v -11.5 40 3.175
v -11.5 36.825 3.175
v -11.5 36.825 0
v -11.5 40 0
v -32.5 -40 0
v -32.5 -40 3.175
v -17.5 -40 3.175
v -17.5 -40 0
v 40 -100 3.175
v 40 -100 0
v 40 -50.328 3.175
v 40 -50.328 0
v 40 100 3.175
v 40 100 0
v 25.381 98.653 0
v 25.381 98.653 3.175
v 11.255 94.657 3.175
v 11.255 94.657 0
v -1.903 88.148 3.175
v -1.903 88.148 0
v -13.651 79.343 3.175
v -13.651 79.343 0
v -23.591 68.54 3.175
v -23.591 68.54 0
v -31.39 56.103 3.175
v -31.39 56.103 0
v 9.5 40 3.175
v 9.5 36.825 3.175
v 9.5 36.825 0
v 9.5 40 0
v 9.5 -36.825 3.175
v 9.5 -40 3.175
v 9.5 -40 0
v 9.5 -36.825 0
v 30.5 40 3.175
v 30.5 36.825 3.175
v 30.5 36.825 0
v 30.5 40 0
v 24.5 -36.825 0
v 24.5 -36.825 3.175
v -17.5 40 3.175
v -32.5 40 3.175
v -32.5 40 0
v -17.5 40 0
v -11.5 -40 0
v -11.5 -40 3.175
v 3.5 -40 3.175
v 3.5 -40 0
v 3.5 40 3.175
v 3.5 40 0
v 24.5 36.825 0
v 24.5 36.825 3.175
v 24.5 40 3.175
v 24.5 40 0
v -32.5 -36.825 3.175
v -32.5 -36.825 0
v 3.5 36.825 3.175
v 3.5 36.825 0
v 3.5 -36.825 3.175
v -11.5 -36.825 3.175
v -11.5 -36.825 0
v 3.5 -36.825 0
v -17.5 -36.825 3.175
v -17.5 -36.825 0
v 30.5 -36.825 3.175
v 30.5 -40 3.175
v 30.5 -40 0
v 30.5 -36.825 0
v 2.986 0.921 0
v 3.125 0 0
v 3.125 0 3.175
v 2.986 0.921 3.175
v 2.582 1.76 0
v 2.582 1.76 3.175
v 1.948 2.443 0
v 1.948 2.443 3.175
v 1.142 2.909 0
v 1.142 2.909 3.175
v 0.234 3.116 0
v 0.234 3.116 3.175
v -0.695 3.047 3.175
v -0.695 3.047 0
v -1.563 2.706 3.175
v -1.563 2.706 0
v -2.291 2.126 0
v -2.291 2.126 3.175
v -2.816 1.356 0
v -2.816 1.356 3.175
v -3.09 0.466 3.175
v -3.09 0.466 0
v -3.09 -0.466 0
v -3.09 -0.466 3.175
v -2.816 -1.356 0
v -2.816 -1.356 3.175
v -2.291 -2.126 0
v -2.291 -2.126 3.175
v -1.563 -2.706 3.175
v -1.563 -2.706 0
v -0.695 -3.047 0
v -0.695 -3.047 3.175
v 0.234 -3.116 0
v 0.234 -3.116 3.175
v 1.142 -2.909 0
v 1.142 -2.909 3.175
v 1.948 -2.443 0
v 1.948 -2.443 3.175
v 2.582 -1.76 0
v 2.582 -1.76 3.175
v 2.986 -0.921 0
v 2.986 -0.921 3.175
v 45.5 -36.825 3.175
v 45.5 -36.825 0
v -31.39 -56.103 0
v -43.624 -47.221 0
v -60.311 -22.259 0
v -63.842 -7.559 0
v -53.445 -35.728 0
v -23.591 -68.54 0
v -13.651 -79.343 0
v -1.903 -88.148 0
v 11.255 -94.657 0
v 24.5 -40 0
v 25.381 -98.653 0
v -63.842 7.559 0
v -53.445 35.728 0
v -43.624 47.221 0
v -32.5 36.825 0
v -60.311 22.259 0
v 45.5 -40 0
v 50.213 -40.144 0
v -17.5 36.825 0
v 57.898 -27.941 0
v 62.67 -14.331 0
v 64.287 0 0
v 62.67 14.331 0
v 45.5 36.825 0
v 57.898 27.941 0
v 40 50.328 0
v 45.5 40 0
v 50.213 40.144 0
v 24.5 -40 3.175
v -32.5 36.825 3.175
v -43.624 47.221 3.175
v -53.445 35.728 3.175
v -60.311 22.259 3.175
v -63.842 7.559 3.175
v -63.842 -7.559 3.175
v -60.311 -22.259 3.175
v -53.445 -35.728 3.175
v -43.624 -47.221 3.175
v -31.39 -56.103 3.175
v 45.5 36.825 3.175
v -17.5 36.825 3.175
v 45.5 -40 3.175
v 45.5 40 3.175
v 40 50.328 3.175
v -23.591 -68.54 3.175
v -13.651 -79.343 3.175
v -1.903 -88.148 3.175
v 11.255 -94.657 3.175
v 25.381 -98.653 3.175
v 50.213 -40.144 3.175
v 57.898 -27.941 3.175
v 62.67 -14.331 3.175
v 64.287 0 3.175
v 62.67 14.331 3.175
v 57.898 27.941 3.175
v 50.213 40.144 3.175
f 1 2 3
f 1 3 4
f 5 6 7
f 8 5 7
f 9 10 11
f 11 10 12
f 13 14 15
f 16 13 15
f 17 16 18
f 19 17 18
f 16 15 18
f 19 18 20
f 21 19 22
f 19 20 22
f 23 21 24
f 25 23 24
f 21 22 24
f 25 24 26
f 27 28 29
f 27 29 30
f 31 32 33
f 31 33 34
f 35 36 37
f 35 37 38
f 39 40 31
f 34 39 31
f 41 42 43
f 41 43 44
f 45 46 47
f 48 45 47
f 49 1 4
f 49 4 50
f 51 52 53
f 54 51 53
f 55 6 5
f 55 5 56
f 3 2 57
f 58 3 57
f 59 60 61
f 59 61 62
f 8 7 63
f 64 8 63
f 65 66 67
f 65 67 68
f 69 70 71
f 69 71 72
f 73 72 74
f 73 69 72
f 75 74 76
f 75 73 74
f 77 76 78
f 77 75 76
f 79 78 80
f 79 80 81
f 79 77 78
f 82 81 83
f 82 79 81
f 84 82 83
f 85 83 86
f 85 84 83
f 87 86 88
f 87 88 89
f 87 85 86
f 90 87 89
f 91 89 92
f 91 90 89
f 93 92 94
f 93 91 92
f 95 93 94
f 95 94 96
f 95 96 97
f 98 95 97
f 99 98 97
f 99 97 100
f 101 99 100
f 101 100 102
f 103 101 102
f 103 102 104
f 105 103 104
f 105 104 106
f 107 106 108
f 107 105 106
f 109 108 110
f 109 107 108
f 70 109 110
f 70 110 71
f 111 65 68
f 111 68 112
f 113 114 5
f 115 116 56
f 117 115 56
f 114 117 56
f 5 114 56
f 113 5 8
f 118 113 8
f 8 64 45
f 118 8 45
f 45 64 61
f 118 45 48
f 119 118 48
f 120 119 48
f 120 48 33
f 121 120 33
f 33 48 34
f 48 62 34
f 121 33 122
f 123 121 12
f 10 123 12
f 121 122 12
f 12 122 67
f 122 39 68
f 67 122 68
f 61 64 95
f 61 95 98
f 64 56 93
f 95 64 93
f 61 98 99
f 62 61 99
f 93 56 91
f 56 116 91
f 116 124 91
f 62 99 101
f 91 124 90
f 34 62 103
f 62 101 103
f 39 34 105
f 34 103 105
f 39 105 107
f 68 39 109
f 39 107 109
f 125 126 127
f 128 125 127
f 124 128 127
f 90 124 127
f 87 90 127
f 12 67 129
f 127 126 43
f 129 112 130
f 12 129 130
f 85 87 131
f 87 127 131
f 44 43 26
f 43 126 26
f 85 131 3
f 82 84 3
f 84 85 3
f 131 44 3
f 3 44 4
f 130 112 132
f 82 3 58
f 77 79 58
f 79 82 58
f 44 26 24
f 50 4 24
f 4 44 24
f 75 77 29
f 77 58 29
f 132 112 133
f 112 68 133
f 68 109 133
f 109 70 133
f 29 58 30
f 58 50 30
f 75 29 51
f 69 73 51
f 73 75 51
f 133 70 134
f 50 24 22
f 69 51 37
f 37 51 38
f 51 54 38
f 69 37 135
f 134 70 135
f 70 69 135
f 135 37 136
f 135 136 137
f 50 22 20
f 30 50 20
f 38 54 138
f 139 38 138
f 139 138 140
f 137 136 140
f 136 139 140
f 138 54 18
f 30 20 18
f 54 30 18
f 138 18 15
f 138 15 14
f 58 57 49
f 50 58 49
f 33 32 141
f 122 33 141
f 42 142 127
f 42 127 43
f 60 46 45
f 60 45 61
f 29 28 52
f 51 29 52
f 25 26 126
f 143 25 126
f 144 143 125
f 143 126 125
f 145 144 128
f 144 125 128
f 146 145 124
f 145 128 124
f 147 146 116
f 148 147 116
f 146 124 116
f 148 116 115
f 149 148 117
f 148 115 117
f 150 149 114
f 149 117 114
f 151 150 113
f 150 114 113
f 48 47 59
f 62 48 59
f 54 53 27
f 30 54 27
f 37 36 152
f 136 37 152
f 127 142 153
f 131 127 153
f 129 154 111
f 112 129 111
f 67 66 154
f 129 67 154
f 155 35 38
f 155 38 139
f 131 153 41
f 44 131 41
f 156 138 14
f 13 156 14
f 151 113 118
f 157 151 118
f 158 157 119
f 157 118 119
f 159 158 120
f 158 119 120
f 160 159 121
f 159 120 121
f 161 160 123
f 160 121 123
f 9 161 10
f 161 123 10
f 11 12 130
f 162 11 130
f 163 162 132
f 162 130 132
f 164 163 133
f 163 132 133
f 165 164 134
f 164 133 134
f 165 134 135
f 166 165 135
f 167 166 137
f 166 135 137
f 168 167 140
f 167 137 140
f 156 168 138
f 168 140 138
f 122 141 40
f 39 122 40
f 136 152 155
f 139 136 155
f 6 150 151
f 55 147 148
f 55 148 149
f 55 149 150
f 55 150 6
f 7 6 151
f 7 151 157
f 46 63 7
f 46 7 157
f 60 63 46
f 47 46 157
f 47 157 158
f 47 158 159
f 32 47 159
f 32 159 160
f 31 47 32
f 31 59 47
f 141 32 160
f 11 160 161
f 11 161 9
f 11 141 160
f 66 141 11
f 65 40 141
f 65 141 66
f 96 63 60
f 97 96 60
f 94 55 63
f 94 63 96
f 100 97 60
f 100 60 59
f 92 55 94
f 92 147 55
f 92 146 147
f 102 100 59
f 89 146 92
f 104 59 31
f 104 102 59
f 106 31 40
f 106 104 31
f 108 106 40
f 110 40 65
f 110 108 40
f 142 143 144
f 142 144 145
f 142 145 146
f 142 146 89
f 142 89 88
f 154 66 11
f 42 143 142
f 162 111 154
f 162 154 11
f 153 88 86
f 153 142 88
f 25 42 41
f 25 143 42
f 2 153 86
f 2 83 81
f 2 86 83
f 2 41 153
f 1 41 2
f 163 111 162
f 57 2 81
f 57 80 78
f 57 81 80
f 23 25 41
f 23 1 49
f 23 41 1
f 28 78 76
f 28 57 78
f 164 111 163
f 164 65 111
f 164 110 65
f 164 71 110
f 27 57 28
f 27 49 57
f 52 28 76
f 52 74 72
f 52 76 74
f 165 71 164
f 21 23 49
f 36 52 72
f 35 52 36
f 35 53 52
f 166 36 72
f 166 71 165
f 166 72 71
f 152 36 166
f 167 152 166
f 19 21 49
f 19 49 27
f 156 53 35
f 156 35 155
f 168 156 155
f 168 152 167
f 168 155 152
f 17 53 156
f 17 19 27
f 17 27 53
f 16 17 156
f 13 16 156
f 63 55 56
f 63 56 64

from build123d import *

# Parameters (mm, degrees)
F0_R     = 3.125
F1_DEPTH = 3.175
F2_W     = 15
F2_H     = 3.175
F2_W_2   = 7.5
F3_DEPTH = 25


# Not quite as in the source:
# - a feature names something its author has since deleted; it is built from what else it names


with BuildPart() as f1:
    # F0 (on Top) → F1 (new body)
    with BuildSketch(Plane.XY):
        with BuildLine():
            ThreePointArc((40, -50.3277523465), (57.898111611, -27.9408541051), (64.2875, 0))
            ThreePointArc((64.2875, 0), (57.898111611, 27.9408541051), (40, 50.3277523465))
            Line((40, 50.3277523465), (40, -50.3277523465))
        make_face()
        with BuildLine():
            Line((40, -50.3277523465), (40, 50.3277523465))
            ThreePointArc((40, 50.3277523465), (5.1835564074, 64.0781819282), (-31.390378499, 56.1028234043))
            ThreePointArc((-31.390378499, 56.1028234043), (-37.8178330459, 38.5576092221), (-40, 20))
            Line((-40, 20), (-40, -20))
            ThreePointArc((-40, -20), (-37.8178330459, -38.5576092221), (-31.390378499, -56.1028234043))
            ThreePointArc((-31.390378499, -56.1028234043), (5.1835564074, -64.0781819282), (40, -50.3277523465))
        make_face()
        Circle(F0_R, mode=Mode.SUBTRACT)
        with BuildLine():
            ThreePointArc((-31.390378499, 56.1028234043), (5.1835564074, 64.0781819282), (40, 50.3277523465))
            Line((40, 50.3277523465), (40, 100))
            ThreePointArc((40, 100), (-1.9033061205, 88.1477287675), (-31.390378499, 56.1028234043))
        make_face()
        with BuildLine():
            Line((40, -100), (40, -50.3277523465))
            ThreePointArc((40, -50.3277523465), (5.1835564074, -64.0781819282), (-31.390378499, -56.1028234043))
            ThreePointArc((-31.390378499, -56.1028234043), (-1.9033061205, -88.1477287675), (40, -100))
        make_face()
        with BuildLine():
            ThreePointArc((-40, 20), (-37.8178330459, 38.5576092221), (-31.390378499, 56.1028234043))
            ThreePointArc((-31.390378499, 56.1028234043), (-64.2875, 0), (-31.390378499, -56.1028234043))
            ThreePointArc((-31.390378499, -56.1028234043), (-37.8178330459, -38.5576092221), (-40, -20))
            Line((-40, -20), (-40, 20))
        make_face()
    extrude(amount=F1_DEPTH)

    # F2 (on face) → F3 (cut)
    with BuildSketch(Plane.XY.offset(3.175)):
        with Locations((-4, 38.4125)):
            Rectangle(F2_W, F2_H)
        with Locations((13.25, 38.4125)):
            Rectangle(F2_W_2, F2_H)
        with Locations((20.75, 38.4125)):
            Rectangle(F2_W_2, F2_H)
        with Locations((38, 38.4125)):
            Rectangle(F2_W, F2_H)
        with Locations((-4, -38.4125)):
            Rectangle(F2_W, F2_H)
        with Locations((20.75, -38.4125)):
            Rectangle(F2_W_2, F2_H)
        with Locations((38, -38.4125)):
            Rectangle(F2_W, F2_H)
        with Locations((13.25, -38.4125)):
            Rectangle(F2_W_2, F2_H)
        with Locations((-25, -38.4125)):
            Rectangle(F2_W, F2_H)
        with Locations((-25, 38.4125)):
            Rectangle(F2_W, F2_H)
    extrude(amount=-F3_DEPTH, mode=Mode.SUBTRACT)


solid = f1.part
